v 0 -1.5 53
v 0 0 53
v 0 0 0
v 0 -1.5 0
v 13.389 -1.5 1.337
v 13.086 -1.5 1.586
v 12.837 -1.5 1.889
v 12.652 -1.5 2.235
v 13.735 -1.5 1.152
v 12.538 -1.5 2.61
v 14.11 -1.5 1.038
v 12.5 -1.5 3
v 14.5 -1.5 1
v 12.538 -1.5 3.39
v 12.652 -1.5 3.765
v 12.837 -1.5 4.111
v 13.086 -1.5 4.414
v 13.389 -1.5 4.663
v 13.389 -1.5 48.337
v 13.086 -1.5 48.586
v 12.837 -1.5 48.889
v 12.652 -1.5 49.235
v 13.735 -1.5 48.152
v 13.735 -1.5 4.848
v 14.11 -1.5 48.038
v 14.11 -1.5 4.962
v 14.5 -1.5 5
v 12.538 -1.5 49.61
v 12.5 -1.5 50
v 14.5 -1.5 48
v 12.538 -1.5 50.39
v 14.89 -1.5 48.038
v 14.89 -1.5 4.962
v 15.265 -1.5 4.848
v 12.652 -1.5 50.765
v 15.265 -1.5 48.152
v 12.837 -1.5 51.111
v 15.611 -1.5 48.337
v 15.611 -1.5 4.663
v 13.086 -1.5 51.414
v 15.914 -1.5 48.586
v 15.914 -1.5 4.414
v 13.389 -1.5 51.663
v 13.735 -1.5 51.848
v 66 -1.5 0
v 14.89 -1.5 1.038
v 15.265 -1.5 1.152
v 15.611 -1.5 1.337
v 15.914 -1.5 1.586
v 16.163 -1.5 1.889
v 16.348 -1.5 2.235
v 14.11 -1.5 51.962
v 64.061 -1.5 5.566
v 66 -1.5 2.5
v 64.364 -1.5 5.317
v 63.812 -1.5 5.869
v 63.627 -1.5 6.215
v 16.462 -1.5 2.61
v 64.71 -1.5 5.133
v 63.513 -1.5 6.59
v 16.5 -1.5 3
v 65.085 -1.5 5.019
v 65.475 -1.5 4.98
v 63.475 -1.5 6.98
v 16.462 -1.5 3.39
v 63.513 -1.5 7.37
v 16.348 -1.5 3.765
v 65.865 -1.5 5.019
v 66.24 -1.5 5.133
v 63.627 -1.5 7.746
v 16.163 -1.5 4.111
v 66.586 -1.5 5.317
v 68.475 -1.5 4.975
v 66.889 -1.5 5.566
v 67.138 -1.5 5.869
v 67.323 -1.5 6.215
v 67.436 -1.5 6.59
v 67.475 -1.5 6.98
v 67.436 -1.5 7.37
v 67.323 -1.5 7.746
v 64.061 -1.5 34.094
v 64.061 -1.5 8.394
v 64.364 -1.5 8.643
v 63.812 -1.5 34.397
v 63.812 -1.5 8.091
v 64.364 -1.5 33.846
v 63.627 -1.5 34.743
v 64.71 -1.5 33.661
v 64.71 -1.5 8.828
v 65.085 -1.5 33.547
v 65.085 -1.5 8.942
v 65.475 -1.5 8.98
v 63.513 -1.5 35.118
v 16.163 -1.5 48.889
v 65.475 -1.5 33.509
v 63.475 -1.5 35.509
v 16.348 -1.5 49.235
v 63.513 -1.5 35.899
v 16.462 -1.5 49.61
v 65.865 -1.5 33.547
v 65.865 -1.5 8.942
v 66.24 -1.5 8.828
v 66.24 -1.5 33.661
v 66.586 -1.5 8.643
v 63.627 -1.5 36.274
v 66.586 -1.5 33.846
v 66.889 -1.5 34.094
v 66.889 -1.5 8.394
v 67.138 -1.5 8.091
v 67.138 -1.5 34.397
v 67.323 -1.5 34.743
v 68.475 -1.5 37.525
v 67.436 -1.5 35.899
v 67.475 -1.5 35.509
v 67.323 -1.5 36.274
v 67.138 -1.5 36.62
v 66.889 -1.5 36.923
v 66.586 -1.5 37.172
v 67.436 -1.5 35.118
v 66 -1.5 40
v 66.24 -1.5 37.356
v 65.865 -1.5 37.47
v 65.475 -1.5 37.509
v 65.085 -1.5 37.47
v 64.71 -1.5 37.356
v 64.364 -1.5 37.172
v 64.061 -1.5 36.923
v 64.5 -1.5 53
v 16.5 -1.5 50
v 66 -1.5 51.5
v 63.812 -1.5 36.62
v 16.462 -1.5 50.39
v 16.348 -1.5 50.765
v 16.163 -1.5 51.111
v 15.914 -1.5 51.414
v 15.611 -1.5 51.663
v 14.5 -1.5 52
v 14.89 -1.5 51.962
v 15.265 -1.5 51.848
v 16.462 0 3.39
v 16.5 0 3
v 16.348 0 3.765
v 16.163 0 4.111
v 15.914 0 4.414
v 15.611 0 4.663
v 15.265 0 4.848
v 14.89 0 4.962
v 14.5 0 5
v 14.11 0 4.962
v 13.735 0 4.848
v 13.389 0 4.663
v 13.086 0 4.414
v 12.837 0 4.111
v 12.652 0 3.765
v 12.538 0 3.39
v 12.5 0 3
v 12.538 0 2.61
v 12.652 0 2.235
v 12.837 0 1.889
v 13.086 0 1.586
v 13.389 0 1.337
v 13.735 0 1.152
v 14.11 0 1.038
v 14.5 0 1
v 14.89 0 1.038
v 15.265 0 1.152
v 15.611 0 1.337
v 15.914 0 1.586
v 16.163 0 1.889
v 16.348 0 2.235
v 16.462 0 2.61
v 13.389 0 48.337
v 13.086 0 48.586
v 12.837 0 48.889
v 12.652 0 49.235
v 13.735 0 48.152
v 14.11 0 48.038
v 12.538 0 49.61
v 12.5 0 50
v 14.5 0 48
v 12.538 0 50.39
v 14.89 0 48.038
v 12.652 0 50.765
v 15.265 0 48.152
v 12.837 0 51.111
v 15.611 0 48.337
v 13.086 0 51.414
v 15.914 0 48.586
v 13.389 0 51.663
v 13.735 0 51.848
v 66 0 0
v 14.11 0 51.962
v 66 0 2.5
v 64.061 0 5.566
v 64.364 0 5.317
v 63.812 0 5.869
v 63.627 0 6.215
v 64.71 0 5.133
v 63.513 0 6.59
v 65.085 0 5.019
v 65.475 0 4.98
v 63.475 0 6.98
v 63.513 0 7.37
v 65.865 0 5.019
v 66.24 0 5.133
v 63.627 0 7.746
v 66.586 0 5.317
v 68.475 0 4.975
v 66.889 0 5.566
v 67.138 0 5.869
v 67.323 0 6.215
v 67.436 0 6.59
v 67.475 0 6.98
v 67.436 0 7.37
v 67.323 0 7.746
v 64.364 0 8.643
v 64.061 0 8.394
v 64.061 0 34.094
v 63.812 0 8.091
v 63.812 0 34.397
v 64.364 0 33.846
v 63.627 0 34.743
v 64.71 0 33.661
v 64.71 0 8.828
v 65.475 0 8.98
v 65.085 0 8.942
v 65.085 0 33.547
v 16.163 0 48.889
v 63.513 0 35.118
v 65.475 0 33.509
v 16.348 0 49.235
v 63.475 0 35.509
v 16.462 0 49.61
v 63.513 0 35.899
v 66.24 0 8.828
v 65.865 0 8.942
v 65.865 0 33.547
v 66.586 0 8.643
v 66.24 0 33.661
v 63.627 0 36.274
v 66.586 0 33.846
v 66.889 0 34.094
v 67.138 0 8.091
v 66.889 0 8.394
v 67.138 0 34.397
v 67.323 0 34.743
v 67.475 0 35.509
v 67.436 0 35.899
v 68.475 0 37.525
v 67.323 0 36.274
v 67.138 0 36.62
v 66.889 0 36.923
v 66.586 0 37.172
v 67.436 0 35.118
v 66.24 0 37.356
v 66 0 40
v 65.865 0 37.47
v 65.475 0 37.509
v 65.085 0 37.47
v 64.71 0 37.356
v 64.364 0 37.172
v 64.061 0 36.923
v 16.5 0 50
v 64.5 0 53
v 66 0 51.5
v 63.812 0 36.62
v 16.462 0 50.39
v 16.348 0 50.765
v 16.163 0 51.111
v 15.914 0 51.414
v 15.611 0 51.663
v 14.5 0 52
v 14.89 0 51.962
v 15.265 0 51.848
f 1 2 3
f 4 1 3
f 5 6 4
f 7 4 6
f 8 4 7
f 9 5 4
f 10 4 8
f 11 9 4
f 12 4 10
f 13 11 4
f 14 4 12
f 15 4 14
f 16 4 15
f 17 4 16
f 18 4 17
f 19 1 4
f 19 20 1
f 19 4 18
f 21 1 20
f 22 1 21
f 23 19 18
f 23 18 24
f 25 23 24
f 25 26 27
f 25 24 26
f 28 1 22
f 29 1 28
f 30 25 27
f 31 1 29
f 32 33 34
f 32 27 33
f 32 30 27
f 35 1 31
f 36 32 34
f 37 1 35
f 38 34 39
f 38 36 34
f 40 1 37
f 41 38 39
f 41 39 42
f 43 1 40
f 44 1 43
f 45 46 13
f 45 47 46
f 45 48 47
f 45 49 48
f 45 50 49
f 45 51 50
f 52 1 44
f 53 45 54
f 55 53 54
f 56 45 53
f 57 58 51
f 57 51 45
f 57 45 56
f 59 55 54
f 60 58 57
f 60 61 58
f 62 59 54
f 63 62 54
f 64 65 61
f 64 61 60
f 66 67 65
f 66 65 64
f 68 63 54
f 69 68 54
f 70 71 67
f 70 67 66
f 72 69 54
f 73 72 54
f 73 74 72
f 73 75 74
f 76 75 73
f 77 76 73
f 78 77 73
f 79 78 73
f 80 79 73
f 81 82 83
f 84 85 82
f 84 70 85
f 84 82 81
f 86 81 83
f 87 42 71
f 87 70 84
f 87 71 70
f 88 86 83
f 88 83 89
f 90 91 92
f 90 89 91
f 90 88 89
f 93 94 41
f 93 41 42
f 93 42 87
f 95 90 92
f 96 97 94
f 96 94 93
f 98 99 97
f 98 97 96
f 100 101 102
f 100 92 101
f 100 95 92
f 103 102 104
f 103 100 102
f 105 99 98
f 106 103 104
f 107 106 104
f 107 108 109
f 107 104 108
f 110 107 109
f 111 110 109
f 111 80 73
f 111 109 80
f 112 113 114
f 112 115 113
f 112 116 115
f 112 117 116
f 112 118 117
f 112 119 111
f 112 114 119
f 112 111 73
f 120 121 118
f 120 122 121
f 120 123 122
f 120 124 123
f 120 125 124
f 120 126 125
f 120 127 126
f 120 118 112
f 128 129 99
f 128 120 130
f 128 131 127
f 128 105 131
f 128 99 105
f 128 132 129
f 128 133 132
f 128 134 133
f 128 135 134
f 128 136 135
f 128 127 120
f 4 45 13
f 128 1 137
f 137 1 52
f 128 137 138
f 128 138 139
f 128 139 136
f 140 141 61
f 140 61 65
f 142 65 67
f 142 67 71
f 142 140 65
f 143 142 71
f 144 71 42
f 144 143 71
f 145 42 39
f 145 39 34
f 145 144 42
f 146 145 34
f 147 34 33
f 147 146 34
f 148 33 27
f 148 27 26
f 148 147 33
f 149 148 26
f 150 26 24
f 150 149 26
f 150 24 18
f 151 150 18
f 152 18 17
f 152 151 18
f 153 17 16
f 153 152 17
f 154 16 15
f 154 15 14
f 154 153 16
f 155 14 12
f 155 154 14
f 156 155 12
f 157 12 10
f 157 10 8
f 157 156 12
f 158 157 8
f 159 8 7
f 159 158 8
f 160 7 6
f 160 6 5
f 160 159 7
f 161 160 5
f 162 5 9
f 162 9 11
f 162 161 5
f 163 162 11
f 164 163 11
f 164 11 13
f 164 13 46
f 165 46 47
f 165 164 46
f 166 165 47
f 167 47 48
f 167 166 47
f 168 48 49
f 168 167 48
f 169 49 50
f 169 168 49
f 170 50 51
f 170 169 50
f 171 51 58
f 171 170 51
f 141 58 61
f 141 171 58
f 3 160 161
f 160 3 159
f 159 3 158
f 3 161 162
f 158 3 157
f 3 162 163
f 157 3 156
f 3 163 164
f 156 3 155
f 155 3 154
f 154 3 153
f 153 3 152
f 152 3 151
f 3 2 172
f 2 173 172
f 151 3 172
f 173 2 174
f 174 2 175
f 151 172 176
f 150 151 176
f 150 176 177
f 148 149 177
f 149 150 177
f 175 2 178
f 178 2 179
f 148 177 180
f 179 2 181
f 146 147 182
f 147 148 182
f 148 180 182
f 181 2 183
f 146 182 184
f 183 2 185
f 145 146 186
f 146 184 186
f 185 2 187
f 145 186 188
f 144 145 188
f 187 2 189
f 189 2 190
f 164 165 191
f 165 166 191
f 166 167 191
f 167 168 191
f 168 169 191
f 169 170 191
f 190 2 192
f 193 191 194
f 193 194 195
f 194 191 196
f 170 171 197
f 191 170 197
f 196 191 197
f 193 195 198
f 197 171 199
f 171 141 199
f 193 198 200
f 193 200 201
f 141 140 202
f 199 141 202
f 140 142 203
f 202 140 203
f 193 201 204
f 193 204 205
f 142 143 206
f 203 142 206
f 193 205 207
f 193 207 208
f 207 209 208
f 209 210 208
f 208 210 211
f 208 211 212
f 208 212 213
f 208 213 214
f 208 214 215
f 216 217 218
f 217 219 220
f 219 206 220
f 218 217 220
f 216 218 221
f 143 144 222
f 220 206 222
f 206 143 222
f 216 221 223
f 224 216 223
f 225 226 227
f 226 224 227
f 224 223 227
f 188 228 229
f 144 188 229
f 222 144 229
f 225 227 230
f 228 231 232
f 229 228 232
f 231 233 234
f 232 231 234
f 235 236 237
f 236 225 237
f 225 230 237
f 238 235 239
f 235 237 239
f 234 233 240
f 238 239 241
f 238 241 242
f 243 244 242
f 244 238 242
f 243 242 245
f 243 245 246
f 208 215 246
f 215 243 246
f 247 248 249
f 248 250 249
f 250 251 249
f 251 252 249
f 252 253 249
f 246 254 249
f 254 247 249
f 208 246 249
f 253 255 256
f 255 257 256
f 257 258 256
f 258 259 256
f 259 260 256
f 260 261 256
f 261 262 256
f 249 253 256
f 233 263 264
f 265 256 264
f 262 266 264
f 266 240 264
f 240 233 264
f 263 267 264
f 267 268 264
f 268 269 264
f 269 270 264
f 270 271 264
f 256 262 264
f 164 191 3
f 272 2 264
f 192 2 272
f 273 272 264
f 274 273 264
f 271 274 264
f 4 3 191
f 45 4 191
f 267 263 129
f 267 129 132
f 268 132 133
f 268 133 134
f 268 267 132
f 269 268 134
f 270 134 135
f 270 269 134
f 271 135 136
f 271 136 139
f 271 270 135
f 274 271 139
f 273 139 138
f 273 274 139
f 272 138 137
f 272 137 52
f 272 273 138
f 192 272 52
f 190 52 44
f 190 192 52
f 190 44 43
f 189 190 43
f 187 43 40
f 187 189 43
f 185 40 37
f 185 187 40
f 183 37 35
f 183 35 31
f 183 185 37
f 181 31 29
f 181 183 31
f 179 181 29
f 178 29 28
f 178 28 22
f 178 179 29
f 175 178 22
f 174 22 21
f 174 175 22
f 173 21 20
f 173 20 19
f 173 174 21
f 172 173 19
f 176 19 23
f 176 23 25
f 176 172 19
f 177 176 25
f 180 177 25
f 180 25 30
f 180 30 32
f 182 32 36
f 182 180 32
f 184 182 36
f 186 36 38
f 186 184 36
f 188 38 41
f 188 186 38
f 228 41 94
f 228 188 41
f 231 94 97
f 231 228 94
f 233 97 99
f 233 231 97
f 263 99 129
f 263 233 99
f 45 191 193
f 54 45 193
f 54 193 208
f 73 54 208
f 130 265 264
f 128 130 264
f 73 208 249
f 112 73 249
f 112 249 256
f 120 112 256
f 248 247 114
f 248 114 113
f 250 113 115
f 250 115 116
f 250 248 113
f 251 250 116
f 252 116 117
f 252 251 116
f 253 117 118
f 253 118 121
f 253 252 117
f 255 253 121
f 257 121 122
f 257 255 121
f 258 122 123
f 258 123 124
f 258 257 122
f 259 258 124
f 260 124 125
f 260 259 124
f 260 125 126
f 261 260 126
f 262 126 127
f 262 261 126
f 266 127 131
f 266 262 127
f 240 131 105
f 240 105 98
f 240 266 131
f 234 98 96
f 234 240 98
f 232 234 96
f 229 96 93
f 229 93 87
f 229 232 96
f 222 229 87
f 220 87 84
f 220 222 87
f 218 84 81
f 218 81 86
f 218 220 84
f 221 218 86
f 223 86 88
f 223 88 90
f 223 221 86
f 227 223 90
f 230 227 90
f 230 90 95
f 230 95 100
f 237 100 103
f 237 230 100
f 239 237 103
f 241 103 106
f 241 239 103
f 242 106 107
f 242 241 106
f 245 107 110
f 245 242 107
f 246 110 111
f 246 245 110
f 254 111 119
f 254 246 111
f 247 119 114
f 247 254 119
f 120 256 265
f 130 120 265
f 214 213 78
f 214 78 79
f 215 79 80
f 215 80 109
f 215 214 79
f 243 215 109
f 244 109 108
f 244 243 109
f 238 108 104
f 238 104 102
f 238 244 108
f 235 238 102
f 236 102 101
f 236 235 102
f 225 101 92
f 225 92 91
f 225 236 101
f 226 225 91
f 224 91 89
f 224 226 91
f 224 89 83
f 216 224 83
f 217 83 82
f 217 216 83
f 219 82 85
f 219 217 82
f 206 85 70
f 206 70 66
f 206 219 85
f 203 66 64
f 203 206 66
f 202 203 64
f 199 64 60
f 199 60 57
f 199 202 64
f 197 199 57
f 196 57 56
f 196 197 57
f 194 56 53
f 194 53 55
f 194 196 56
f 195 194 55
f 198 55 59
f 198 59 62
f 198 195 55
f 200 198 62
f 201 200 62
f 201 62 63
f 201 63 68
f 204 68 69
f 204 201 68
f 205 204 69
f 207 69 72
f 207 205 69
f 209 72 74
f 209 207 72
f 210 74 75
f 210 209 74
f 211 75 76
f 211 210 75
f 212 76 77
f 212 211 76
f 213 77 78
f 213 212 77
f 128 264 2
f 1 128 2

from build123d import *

# Parameters (mm, degrees)
F0_R     = 2
F1_DEPTH = 1.5


with BuildPart() as f1:
    # F0 (on Front) → F1 (new body)
    with BuildSketch(Plane.XZ):
        Polygon((0, 53), (0, 0), (66, 0), (66, 2.5), (68.474874, 4.974874), (68.474874, 37.525126), (66, 40), (66, 49.5), (66, 51.5), (64.5, 53), align=None)
        with Locations((14.5, 3)):
            Circle(F0_R, mode=Mode.SUBTRACT)
        with Locations((65.474874, 6.980275)):
            Circle(F0_R, mode=Mode.SUBTRACT)
        with Locations((14.5, 50)):
            Circle(F0_R, mode=Mode.SUBTRACT)
        with Locations((65.474874, 35.50862)):
            Circle(F0_R, mode=Mode.SUBTRACT)
    extrude(amount=F1_DEPTH)


solid = f1.part
